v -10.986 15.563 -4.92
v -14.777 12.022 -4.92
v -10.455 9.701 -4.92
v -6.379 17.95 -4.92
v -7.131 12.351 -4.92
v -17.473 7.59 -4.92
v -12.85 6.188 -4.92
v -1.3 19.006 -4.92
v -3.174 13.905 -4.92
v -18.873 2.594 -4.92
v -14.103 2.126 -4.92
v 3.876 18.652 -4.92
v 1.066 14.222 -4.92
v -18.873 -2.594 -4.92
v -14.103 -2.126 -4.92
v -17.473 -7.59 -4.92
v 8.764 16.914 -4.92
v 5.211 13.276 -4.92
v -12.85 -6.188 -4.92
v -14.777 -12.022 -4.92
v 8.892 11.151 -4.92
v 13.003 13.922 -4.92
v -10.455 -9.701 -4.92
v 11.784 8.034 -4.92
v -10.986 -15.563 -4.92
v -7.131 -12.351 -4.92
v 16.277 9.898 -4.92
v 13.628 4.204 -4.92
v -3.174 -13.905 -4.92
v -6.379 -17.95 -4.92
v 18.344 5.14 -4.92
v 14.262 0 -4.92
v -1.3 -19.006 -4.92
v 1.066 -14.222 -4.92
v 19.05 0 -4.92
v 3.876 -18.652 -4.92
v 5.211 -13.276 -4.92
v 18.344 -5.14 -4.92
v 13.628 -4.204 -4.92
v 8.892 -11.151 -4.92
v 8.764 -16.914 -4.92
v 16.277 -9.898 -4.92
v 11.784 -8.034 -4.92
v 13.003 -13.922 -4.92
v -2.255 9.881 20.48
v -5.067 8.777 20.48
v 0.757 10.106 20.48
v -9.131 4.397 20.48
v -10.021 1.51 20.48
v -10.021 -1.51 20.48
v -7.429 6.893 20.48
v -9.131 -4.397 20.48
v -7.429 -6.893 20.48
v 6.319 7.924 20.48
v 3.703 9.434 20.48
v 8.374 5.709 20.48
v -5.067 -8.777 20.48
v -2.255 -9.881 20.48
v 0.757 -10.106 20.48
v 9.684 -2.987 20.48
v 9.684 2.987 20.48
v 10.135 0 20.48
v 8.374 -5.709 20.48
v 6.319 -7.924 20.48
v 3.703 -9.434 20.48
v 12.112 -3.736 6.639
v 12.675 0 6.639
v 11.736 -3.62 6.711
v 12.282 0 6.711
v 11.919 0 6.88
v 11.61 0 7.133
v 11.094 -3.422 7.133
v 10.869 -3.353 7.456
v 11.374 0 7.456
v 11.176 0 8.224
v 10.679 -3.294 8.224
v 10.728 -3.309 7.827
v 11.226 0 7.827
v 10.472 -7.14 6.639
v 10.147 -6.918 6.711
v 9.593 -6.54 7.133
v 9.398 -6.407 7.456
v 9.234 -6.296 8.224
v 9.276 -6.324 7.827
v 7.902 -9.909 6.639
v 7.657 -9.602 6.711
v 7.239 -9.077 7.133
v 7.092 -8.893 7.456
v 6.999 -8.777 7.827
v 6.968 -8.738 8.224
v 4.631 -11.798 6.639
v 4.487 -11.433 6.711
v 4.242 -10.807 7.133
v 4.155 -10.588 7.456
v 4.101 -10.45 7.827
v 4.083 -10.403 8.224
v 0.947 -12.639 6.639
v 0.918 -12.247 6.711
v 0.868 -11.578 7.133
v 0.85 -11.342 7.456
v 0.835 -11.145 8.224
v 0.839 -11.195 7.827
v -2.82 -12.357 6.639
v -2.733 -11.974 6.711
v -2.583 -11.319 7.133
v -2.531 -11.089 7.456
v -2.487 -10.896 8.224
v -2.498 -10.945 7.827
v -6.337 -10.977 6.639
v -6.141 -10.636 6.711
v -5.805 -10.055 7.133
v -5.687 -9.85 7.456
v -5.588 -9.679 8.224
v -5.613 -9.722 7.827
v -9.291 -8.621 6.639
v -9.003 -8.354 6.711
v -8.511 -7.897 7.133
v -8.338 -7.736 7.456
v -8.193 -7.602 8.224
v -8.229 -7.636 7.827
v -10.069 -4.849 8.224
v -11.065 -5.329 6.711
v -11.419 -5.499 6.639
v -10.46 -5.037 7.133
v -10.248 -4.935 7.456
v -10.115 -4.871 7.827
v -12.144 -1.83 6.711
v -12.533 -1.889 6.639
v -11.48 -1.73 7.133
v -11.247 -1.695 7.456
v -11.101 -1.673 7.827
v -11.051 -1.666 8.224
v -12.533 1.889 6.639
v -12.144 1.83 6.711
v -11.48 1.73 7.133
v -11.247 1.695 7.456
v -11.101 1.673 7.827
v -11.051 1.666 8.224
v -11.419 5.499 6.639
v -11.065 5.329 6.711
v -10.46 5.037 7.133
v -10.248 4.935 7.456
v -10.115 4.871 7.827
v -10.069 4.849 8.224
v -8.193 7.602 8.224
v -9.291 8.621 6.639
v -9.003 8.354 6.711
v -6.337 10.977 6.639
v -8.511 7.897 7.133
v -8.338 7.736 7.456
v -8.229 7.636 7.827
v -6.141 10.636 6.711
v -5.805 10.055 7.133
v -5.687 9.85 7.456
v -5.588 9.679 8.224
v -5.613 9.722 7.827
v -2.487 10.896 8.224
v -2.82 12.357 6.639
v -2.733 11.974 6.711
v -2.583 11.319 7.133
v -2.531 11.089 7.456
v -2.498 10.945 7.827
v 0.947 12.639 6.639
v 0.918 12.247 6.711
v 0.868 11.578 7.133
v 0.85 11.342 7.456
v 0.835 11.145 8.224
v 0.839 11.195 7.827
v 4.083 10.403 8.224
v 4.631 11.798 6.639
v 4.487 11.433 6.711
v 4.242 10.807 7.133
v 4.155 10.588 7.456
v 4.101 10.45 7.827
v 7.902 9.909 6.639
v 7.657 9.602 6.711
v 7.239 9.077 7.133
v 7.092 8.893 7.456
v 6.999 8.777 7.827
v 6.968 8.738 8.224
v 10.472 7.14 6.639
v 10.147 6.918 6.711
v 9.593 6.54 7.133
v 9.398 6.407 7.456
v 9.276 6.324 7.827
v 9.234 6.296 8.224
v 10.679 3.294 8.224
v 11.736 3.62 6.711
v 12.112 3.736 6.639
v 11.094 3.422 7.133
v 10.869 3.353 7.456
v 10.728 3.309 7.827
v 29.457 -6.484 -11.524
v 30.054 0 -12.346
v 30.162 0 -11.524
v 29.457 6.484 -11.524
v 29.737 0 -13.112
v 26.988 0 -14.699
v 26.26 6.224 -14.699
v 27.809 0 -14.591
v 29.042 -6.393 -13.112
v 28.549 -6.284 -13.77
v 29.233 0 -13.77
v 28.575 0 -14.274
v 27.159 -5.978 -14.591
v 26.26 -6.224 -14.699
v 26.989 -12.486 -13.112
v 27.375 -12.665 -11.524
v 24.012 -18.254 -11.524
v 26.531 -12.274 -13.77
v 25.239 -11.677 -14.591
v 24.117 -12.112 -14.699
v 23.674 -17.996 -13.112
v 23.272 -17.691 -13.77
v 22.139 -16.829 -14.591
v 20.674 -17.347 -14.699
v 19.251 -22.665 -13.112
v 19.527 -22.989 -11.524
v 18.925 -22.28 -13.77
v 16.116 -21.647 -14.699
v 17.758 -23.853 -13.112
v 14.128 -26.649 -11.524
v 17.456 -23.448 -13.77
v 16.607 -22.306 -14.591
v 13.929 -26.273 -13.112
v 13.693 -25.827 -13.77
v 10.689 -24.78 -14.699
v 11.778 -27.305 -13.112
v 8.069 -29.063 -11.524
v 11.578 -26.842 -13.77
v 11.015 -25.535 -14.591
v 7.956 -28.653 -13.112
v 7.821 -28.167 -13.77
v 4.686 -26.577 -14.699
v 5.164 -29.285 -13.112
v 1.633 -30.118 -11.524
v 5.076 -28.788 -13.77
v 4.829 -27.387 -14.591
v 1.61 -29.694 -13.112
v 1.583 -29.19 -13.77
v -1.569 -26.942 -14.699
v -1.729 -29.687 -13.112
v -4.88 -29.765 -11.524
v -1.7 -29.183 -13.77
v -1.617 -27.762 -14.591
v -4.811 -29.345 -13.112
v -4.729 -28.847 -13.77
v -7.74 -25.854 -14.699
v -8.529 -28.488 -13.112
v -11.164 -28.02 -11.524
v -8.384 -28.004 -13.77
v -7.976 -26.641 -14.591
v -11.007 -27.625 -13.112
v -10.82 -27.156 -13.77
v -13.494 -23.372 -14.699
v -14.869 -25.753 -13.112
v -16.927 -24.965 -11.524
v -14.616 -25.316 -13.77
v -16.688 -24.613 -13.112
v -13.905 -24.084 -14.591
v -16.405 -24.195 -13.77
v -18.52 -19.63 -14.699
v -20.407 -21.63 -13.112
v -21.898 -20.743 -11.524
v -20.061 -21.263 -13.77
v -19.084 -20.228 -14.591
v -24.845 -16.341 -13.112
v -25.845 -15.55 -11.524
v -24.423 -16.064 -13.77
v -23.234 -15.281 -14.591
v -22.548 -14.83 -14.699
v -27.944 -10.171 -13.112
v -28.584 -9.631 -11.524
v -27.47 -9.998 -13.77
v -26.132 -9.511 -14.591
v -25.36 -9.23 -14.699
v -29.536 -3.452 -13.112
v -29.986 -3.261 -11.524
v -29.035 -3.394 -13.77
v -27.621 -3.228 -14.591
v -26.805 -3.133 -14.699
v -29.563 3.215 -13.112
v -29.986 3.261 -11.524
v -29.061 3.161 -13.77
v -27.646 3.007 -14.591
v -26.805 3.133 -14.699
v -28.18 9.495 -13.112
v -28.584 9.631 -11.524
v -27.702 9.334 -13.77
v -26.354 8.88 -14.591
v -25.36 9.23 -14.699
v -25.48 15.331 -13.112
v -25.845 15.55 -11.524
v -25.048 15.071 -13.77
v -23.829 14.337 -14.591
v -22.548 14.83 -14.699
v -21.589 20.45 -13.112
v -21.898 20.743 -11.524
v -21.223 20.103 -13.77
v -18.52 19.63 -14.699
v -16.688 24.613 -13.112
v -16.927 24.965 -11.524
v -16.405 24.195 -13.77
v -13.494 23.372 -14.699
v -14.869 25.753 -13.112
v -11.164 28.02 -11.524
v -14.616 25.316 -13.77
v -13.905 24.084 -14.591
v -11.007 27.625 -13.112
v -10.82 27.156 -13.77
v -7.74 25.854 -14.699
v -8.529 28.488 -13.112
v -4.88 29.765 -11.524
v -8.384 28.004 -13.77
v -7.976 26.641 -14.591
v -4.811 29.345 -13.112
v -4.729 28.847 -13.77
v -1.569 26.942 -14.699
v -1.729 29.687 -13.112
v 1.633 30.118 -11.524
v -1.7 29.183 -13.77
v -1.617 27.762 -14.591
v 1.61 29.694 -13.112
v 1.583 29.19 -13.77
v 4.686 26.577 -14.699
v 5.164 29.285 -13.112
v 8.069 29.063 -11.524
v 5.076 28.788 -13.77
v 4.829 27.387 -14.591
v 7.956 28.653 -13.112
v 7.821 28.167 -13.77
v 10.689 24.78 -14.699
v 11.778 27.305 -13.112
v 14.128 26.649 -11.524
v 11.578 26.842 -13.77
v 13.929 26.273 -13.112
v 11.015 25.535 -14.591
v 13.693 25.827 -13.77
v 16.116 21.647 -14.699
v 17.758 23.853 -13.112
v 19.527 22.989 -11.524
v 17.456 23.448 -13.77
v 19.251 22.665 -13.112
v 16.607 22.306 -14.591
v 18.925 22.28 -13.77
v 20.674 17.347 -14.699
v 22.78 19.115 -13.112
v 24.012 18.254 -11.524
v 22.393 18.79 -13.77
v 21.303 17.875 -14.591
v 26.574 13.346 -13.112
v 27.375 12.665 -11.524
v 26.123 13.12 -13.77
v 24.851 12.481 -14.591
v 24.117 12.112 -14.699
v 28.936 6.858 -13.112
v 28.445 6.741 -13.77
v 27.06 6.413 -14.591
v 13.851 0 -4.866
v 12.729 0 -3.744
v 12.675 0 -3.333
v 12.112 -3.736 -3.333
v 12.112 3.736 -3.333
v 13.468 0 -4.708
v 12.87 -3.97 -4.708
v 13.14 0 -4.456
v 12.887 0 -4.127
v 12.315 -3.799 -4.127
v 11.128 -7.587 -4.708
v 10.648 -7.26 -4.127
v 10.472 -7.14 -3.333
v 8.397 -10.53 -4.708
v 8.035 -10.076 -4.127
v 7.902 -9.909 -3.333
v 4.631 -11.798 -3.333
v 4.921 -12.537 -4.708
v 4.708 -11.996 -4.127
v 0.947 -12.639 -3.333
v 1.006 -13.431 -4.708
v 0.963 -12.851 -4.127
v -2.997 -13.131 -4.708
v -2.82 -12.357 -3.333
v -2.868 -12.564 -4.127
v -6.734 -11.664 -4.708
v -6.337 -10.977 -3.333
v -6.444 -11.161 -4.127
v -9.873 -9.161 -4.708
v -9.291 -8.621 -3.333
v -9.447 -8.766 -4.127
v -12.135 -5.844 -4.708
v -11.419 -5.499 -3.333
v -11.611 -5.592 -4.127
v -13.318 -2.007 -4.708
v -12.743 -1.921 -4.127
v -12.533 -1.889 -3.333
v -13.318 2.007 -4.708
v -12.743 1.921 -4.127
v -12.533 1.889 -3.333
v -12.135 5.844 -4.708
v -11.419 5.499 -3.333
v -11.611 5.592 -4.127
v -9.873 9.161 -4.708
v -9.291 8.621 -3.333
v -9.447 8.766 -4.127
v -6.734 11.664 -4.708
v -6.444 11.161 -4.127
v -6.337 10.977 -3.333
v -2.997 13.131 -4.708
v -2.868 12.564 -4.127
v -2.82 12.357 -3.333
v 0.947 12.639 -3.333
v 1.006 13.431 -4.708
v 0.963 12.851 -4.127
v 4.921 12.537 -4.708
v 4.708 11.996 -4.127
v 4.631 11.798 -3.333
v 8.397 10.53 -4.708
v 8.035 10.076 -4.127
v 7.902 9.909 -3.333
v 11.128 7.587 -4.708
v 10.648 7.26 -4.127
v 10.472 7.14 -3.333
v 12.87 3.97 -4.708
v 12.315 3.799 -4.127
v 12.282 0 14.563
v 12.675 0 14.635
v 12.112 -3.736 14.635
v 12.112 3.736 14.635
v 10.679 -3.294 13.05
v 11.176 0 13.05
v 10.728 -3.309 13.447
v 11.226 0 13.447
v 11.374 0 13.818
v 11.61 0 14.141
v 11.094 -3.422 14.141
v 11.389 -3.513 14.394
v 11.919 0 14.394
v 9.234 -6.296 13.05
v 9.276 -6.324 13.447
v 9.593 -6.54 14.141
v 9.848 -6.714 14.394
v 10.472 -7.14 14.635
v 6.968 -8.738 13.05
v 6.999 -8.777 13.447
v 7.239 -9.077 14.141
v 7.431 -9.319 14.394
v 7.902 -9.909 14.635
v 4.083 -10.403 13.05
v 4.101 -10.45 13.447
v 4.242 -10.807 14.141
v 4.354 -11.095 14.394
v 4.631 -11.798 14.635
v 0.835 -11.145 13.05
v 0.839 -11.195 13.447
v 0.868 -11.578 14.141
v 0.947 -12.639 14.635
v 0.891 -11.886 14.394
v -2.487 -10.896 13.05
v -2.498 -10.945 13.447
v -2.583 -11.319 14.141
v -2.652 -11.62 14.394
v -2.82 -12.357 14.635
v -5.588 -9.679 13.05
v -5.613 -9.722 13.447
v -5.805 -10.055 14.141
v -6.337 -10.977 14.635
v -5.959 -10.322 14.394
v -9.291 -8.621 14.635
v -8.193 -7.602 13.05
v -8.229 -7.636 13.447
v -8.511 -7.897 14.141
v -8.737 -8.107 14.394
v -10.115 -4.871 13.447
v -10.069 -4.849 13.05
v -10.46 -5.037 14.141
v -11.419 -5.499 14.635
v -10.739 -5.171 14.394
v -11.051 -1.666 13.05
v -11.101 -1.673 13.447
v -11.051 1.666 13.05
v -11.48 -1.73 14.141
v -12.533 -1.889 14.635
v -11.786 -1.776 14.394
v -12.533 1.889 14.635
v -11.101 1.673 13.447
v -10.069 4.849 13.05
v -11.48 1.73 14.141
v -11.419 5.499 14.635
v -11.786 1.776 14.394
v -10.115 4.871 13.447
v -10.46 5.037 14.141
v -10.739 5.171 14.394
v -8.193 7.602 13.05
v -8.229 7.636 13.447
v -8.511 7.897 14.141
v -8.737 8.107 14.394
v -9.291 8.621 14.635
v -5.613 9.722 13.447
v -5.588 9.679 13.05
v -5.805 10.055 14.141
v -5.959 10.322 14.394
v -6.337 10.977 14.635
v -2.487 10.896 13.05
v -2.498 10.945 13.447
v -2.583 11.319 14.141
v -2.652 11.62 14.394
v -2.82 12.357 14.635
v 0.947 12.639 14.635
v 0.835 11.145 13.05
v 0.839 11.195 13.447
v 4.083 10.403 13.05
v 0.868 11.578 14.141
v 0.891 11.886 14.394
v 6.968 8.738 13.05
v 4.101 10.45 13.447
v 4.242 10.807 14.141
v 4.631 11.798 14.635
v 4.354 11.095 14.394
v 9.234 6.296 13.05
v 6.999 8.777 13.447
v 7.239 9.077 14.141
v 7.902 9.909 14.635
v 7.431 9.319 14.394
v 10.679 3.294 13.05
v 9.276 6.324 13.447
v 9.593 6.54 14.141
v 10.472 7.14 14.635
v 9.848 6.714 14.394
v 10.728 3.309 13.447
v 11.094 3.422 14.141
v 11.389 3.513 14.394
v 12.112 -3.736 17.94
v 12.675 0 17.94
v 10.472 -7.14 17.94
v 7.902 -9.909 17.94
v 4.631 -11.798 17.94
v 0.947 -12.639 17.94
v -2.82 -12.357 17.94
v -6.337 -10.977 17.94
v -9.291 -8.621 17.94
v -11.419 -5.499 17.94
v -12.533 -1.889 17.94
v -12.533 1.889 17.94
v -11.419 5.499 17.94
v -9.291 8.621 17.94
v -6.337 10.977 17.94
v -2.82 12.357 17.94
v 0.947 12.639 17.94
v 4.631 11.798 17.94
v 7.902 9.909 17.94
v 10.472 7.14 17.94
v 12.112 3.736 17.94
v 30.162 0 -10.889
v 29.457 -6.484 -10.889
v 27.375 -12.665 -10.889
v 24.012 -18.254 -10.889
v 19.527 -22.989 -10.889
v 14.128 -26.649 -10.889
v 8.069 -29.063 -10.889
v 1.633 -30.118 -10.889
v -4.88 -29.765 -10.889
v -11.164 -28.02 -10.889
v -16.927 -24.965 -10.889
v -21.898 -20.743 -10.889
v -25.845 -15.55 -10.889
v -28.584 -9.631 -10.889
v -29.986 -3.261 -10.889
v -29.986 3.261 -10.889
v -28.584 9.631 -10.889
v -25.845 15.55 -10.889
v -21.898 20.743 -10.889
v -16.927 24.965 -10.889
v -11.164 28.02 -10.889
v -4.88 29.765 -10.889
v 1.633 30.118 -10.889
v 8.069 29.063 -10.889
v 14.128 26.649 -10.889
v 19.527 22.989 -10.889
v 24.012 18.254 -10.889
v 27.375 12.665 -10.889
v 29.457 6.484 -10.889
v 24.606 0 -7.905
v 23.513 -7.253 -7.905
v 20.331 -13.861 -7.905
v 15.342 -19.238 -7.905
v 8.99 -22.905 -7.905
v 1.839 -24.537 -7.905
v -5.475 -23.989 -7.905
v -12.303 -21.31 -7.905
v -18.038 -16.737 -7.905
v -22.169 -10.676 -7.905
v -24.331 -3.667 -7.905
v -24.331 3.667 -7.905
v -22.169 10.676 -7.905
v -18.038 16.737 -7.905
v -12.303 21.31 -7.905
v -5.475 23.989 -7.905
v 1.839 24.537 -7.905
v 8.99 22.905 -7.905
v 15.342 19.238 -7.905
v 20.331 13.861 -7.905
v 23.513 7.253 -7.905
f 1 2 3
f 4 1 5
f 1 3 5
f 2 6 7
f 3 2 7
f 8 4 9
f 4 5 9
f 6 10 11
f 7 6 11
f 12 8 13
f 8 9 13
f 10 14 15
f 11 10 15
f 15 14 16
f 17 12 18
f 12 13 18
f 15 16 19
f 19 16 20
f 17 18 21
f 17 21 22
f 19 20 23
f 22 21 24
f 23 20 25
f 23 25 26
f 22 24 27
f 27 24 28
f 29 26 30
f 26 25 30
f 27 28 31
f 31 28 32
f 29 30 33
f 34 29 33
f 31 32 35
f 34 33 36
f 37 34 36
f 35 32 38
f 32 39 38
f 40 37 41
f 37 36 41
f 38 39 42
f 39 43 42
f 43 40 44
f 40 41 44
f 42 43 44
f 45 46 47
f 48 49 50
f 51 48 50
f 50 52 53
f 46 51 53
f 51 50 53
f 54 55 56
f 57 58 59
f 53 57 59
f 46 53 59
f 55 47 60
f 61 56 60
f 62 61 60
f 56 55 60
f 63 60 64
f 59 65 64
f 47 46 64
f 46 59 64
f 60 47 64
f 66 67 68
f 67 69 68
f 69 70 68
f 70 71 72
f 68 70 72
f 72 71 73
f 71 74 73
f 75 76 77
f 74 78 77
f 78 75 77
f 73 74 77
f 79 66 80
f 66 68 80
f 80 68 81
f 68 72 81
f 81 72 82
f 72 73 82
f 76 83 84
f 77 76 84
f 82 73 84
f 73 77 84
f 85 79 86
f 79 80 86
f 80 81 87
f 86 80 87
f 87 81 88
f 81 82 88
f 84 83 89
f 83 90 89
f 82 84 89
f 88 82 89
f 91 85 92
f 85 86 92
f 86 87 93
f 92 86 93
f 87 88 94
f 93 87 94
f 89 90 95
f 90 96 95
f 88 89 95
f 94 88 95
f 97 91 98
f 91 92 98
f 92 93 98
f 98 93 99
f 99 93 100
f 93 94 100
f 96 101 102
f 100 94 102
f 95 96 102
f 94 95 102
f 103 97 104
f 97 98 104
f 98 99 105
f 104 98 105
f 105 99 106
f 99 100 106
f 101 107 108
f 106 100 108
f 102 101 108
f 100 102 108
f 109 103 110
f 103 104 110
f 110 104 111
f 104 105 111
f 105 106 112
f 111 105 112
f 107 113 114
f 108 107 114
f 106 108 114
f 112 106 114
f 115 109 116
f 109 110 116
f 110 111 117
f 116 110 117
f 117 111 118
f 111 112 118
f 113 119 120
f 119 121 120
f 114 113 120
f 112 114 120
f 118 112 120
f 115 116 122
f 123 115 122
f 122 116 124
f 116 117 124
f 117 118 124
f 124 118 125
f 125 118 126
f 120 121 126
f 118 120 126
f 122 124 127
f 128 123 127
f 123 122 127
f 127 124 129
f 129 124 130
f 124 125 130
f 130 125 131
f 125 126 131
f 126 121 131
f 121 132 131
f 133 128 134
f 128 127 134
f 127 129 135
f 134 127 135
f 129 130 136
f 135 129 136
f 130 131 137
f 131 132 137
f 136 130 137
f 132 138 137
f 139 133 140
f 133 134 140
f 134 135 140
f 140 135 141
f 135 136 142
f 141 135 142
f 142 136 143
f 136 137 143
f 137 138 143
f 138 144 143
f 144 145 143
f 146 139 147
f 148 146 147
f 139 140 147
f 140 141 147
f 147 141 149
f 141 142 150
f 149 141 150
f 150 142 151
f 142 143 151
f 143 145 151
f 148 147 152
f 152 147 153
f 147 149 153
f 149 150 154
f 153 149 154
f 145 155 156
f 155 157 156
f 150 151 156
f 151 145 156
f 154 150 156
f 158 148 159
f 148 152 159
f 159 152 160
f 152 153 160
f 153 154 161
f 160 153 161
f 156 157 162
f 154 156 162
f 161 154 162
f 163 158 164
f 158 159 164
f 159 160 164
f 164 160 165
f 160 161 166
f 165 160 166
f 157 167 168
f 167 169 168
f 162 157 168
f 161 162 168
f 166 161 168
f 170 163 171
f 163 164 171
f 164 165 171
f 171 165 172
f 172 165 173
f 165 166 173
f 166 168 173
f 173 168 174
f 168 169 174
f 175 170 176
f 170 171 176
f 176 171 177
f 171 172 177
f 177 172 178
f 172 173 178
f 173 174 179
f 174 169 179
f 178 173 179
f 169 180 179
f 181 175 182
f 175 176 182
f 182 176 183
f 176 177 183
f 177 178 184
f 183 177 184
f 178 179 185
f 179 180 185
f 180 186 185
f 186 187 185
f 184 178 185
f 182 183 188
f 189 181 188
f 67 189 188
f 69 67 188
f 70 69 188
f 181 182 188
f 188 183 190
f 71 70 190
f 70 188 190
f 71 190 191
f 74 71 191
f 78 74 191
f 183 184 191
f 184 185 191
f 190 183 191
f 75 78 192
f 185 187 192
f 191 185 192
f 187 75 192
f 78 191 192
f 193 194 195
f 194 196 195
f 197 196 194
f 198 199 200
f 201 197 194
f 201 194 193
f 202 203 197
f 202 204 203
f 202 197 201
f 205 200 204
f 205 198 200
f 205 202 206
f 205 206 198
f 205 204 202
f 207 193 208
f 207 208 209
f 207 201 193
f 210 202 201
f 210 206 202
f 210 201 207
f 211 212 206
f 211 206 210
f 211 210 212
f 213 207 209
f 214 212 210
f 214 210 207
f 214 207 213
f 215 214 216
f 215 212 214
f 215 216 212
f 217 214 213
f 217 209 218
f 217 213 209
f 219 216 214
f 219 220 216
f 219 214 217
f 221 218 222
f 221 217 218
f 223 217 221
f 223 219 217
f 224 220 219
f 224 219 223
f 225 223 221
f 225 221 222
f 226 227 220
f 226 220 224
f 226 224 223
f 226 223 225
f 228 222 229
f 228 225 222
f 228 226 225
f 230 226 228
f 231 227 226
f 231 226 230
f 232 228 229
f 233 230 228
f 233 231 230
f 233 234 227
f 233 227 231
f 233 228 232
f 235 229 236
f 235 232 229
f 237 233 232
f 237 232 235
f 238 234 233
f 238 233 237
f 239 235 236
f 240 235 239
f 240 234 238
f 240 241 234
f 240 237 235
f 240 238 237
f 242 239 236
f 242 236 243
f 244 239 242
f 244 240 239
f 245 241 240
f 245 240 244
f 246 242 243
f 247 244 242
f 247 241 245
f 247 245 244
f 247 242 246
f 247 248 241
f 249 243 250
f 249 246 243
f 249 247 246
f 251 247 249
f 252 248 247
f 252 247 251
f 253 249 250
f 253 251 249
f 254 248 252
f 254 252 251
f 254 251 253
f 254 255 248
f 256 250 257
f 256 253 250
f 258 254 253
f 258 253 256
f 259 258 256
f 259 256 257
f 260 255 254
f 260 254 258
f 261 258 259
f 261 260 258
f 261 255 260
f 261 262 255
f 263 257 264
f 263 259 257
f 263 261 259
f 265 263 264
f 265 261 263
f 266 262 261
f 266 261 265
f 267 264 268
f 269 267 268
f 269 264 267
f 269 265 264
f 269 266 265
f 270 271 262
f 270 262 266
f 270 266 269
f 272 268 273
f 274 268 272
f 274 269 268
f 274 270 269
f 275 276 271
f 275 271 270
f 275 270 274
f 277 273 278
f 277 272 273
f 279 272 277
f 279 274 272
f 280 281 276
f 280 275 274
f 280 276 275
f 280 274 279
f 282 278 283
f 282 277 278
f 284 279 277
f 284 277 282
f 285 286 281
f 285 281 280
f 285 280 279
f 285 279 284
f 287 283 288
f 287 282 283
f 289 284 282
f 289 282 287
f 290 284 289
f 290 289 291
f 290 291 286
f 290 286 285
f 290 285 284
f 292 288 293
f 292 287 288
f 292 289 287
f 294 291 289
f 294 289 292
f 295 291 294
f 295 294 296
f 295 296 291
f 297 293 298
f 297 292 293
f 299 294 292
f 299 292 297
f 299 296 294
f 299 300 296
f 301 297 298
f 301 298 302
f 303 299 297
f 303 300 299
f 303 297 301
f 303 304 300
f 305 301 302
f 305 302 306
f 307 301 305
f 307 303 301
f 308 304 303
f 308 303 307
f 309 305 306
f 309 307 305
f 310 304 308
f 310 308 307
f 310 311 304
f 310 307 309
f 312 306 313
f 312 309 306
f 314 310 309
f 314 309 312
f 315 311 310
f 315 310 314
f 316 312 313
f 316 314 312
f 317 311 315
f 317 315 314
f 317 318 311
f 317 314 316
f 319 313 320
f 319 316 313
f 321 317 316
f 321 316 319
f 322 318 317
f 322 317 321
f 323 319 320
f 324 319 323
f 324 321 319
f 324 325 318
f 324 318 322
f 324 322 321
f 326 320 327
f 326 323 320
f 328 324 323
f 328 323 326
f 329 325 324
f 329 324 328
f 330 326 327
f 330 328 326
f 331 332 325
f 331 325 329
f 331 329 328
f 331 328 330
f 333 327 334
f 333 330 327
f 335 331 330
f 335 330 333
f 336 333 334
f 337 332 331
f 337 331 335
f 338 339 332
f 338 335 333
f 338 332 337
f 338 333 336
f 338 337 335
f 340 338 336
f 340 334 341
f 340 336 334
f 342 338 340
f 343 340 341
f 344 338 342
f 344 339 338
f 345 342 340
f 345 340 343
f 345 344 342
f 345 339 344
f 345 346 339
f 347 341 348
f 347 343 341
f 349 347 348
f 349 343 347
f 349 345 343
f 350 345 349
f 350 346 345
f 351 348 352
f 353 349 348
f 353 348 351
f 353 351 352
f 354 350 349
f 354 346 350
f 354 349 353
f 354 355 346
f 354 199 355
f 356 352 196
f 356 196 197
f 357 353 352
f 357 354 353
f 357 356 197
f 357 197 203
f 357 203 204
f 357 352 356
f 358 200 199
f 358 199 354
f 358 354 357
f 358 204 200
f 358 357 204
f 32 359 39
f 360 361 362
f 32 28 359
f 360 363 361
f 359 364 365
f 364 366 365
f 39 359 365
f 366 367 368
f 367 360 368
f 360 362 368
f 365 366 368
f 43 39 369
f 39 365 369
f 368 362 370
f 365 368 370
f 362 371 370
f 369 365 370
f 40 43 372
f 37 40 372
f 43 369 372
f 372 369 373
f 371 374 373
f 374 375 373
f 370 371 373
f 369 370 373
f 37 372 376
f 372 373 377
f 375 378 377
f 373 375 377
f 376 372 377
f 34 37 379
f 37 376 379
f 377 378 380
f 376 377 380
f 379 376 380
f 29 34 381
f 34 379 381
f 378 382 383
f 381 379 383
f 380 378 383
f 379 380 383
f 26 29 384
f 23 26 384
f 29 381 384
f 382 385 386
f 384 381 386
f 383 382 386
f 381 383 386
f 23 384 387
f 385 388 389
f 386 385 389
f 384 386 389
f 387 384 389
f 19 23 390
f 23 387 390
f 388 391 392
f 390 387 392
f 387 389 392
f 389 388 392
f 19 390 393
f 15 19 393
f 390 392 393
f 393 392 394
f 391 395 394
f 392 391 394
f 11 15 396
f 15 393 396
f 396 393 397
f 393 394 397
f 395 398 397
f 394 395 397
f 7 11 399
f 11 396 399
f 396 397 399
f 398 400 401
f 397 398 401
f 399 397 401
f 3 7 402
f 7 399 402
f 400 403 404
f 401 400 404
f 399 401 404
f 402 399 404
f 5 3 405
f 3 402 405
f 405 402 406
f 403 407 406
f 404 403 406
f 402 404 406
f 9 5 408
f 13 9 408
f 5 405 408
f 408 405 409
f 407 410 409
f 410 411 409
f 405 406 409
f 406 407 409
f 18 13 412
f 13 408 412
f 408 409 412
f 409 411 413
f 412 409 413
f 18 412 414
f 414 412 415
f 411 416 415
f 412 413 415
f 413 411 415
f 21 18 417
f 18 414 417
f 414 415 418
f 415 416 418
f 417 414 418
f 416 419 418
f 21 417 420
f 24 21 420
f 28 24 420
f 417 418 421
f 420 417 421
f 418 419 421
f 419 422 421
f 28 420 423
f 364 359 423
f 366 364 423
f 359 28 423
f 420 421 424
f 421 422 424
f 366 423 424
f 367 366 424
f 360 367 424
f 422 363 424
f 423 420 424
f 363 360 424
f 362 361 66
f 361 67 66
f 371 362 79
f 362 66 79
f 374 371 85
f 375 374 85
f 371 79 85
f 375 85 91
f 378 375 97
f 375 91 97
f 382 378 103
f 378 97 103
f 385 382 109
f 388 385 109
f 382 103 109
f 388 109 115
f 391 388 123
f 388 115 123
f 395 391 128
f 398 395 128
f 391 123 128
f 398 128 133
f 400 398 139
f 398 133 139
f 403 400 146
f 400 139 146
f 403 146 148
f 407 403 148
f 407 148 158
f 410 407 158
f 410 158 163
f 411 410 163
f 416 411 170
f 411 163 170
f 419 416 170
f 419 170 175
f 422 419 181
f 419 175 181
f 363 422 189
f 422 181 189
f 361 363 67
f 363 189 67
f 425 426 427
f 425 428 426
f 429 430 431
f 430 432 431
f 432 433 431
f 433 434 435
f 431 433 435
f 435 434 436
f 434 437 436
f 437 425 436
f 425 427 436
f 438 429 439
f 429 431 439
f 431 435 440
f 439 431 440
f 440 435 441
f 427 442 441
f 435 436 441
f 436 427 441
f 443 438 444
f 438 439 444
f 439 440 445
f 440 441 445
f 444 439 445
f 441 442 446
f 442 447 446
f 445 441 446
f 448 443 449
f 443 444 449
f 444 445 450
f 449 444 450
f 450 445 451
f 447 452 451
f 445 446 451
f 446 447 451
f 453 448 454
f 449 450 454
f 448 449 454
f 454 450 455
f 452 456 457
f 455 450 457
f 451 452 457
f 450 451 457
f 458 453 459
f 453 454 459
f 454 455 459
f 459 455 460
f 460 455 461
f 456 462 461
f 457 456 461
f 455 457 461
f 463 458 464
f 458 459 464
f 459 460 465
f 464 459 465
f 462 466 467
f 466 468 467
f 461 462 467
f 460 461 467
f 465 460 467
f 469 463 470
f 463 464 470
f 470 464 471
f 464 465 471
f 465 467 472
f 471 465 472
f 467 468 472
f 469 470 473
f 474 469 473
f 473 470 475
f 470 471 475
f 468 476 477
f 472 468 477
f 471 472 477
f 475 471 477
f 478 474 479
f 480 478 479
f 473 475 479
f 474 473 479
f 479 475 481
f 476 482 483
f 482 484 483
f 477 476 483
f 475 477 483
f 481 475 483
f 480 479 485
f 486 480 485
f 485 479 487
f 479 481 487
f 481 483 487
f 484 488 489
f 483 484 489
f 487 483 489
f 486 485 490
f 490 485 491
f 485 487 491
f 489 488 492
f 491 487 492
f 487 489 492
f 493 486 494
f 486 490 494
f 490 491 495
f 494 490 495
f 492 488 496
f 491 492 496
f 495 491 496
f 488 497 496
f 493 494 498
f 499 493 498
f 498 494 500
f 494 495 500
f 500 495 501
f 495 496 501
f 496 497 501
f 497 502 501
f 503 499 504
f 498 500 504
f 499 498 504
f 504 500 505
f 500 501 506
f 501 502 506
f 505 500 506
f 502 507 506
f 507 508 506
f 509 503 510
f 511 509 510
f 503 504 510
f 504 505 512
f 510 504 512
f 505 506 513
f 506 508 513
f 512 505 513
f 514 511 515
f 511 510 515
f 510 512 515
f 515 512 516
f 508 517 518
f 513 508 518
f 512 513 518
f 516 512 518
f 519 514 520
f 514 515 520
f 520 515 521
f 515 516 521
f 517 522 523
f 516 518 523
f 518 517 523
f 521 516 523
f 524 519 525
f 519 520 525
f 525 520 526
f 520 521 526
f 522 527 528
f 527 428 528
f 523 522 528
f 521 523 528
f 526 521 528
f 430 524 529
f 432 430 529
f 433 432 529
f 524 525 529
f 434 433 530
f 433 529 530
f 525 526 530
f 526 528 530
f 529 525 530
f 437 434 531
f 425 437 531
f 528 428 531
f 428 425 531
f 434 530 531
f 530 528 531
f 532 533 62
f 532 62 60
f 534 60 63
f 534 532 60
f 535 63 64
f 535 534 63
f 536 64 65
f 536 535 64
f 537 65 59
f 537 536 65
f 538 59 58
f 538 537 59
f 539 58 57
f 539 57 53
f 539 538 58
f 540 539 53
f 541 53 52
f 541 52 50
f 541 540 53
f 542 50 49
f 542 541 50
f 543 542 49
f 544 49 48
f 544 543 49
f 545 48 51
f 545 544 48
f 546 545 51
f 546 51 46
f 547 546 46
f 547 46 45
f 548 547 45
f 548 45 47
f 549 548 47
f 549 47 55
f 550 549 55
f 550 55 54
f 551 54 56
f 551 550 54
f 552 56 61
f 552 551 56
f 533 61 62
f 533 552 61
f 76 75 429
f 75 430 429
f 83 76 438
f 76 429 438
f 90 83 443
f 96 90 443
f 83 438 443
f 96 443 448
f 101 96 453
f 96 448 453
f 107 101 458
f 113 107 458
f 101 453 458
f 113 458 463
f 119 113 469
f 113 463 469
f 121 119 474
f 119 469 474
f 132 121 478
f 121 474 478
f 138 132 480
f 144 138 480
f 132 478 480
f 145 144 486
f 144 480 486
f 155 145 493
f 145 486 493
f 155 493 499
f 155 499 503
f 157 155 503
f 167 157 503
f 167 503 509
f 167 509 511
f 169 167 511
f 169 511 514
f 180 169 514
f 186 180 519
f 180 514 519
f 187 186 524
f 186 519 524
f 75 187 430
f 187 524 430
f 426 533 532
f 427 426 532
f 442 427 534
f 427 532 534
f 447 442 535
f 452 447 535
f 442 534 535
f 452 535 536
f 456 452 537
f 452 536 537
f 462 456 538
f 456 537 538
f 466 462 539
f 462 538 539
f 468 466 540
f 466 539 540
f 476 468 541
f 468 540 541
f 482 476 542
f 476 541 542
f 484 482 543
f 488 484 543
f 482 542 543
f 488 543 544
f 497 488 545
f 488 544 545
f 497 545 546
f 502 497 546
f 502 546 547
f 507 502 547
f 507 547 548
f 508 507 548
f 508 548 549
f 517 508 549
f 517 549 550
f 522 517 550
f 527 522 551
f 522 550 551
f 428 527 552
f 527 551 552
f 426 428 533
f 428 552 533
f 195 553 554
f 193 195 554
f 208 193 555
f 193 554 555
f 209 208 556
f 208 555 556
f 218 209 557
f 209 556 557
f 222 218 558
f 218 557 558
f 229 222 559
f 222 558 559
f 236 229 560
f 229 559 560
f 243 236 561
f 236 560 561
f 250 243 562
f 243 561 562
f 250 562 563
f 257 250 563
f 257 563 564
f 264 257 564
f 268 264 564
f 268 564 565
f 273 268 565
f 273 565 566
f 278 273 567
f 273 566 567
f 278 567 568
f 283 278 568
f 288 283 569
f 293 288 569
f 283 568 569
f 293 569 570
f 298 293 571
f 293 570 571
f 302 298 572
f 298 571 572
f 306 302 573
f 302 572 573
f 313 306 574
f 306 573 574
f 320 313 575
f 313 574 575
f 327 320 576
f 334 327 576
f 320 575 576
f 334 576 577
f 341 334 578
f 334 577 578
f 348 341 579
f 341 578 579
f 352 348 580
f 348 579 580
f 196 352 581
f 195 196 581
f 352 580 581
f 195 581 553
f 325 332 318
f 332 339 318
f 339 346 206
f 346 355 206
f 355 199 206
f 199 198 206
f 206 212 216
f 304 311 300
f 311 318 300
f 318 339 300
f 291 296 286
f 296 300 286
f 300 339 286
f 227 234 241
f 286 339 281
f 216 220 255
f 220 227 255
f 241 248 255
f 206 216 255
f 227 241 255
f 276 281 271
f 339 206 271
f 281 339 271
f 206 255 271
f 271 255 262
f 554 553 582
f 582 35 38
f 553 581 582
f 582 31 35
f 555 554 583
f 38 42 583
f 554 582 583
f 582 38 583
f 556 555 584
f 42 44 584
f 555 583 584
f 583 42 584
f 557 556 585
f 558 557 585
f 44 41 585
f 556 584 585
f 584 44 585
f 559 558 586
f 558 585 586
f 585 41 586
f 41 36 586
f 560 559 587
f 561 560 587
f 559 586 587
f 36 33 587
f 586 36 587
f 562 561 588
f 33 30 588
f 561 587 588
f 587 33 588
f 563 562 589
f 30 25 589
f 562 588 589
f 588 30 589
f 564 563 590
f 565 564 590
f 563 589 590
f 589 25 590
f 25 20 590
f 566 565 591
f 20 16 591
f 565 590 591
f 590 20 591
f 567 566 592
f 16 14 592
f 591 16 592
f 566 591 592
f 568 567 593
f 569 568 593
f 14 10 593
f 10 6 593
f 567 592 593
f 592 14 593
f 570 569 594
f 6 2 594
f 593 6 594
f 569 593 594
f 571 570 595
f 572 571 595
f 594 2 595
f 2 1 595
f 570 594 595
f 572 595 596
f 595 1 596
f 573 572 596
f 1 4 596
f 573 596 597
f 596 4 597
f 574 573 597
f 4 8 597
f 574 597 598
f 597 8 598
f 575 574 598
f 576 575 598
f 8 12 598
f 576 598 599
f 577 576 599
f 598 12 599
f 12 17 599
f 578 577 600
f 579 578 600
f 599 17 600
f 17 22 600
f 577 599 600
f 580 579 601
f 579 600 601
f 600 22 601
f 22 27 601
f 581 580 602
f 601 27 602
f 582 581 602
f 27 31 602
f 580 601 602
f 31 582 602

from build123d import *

# Parameters (mm, degrees)
F2_SIZE = 2.54
F3_R    = 3.175


with BuildPart() as f1:
    # F0 (on Front) → F1 (revolve)
    with BuildSketch(Plane.XZ):
        with BuildLine():
            Line((12.6746, 20.479507), (0, 20.479507))
            Line((0, 20.479507), (0, -14.699493))
            Line((0, -14.699493), (30.1625, -14.699493))
            Line((30.1625, -14.699493), (30.1625, -10.889493))
            Line((30.1625, -10.889493), (19.05, -4.920493))
            Line((19.05, -4.920493), (14.2621, -4.920493))
            ThreePointArc((14.2621, -4.920493), (13.139568, -4.455525), (12.6746, -3.332993))
            Line((12.6746, -3.332993), (12.6746, 6.636507))
            Line((12.6746, 6.636507), (12.6746, 6.638998))
            ThreePointArc((12.6746, 6.638998), (11.609965, 7.133359), (11.176, 8.224007))
            Line((11.176, 8.224007), (11.176, 13.050007))
            ThreePointArc((11.176, 13.050007), (11.609965, 14.140656), (12.6746, 14.635016))
            Line((12.6746, 14.635016), (12.6746, 14.637507))
            Line((12.6746, 14.637507), (12.6746, 20.479507))
        make_face()
    revolve(axis=Axis((0, 0, 2.082966), (0, 0, -1)))

    # F2
    f2_edges = [f1.edges().sort_by_distance(p)[0] for p in [
        (-12.6746, 0, 20.479507),
    ]]
    chamfer(f2_edges, length=F2_SIZE)

    # F3
    f3_edges = [f1.edges().sort_by_distance(p)[0] for p in [
        (-30.1625, 0, -14.699493),
    ]]
    fillet(f3_edges, radius=F3_R)


solid = f1.part
